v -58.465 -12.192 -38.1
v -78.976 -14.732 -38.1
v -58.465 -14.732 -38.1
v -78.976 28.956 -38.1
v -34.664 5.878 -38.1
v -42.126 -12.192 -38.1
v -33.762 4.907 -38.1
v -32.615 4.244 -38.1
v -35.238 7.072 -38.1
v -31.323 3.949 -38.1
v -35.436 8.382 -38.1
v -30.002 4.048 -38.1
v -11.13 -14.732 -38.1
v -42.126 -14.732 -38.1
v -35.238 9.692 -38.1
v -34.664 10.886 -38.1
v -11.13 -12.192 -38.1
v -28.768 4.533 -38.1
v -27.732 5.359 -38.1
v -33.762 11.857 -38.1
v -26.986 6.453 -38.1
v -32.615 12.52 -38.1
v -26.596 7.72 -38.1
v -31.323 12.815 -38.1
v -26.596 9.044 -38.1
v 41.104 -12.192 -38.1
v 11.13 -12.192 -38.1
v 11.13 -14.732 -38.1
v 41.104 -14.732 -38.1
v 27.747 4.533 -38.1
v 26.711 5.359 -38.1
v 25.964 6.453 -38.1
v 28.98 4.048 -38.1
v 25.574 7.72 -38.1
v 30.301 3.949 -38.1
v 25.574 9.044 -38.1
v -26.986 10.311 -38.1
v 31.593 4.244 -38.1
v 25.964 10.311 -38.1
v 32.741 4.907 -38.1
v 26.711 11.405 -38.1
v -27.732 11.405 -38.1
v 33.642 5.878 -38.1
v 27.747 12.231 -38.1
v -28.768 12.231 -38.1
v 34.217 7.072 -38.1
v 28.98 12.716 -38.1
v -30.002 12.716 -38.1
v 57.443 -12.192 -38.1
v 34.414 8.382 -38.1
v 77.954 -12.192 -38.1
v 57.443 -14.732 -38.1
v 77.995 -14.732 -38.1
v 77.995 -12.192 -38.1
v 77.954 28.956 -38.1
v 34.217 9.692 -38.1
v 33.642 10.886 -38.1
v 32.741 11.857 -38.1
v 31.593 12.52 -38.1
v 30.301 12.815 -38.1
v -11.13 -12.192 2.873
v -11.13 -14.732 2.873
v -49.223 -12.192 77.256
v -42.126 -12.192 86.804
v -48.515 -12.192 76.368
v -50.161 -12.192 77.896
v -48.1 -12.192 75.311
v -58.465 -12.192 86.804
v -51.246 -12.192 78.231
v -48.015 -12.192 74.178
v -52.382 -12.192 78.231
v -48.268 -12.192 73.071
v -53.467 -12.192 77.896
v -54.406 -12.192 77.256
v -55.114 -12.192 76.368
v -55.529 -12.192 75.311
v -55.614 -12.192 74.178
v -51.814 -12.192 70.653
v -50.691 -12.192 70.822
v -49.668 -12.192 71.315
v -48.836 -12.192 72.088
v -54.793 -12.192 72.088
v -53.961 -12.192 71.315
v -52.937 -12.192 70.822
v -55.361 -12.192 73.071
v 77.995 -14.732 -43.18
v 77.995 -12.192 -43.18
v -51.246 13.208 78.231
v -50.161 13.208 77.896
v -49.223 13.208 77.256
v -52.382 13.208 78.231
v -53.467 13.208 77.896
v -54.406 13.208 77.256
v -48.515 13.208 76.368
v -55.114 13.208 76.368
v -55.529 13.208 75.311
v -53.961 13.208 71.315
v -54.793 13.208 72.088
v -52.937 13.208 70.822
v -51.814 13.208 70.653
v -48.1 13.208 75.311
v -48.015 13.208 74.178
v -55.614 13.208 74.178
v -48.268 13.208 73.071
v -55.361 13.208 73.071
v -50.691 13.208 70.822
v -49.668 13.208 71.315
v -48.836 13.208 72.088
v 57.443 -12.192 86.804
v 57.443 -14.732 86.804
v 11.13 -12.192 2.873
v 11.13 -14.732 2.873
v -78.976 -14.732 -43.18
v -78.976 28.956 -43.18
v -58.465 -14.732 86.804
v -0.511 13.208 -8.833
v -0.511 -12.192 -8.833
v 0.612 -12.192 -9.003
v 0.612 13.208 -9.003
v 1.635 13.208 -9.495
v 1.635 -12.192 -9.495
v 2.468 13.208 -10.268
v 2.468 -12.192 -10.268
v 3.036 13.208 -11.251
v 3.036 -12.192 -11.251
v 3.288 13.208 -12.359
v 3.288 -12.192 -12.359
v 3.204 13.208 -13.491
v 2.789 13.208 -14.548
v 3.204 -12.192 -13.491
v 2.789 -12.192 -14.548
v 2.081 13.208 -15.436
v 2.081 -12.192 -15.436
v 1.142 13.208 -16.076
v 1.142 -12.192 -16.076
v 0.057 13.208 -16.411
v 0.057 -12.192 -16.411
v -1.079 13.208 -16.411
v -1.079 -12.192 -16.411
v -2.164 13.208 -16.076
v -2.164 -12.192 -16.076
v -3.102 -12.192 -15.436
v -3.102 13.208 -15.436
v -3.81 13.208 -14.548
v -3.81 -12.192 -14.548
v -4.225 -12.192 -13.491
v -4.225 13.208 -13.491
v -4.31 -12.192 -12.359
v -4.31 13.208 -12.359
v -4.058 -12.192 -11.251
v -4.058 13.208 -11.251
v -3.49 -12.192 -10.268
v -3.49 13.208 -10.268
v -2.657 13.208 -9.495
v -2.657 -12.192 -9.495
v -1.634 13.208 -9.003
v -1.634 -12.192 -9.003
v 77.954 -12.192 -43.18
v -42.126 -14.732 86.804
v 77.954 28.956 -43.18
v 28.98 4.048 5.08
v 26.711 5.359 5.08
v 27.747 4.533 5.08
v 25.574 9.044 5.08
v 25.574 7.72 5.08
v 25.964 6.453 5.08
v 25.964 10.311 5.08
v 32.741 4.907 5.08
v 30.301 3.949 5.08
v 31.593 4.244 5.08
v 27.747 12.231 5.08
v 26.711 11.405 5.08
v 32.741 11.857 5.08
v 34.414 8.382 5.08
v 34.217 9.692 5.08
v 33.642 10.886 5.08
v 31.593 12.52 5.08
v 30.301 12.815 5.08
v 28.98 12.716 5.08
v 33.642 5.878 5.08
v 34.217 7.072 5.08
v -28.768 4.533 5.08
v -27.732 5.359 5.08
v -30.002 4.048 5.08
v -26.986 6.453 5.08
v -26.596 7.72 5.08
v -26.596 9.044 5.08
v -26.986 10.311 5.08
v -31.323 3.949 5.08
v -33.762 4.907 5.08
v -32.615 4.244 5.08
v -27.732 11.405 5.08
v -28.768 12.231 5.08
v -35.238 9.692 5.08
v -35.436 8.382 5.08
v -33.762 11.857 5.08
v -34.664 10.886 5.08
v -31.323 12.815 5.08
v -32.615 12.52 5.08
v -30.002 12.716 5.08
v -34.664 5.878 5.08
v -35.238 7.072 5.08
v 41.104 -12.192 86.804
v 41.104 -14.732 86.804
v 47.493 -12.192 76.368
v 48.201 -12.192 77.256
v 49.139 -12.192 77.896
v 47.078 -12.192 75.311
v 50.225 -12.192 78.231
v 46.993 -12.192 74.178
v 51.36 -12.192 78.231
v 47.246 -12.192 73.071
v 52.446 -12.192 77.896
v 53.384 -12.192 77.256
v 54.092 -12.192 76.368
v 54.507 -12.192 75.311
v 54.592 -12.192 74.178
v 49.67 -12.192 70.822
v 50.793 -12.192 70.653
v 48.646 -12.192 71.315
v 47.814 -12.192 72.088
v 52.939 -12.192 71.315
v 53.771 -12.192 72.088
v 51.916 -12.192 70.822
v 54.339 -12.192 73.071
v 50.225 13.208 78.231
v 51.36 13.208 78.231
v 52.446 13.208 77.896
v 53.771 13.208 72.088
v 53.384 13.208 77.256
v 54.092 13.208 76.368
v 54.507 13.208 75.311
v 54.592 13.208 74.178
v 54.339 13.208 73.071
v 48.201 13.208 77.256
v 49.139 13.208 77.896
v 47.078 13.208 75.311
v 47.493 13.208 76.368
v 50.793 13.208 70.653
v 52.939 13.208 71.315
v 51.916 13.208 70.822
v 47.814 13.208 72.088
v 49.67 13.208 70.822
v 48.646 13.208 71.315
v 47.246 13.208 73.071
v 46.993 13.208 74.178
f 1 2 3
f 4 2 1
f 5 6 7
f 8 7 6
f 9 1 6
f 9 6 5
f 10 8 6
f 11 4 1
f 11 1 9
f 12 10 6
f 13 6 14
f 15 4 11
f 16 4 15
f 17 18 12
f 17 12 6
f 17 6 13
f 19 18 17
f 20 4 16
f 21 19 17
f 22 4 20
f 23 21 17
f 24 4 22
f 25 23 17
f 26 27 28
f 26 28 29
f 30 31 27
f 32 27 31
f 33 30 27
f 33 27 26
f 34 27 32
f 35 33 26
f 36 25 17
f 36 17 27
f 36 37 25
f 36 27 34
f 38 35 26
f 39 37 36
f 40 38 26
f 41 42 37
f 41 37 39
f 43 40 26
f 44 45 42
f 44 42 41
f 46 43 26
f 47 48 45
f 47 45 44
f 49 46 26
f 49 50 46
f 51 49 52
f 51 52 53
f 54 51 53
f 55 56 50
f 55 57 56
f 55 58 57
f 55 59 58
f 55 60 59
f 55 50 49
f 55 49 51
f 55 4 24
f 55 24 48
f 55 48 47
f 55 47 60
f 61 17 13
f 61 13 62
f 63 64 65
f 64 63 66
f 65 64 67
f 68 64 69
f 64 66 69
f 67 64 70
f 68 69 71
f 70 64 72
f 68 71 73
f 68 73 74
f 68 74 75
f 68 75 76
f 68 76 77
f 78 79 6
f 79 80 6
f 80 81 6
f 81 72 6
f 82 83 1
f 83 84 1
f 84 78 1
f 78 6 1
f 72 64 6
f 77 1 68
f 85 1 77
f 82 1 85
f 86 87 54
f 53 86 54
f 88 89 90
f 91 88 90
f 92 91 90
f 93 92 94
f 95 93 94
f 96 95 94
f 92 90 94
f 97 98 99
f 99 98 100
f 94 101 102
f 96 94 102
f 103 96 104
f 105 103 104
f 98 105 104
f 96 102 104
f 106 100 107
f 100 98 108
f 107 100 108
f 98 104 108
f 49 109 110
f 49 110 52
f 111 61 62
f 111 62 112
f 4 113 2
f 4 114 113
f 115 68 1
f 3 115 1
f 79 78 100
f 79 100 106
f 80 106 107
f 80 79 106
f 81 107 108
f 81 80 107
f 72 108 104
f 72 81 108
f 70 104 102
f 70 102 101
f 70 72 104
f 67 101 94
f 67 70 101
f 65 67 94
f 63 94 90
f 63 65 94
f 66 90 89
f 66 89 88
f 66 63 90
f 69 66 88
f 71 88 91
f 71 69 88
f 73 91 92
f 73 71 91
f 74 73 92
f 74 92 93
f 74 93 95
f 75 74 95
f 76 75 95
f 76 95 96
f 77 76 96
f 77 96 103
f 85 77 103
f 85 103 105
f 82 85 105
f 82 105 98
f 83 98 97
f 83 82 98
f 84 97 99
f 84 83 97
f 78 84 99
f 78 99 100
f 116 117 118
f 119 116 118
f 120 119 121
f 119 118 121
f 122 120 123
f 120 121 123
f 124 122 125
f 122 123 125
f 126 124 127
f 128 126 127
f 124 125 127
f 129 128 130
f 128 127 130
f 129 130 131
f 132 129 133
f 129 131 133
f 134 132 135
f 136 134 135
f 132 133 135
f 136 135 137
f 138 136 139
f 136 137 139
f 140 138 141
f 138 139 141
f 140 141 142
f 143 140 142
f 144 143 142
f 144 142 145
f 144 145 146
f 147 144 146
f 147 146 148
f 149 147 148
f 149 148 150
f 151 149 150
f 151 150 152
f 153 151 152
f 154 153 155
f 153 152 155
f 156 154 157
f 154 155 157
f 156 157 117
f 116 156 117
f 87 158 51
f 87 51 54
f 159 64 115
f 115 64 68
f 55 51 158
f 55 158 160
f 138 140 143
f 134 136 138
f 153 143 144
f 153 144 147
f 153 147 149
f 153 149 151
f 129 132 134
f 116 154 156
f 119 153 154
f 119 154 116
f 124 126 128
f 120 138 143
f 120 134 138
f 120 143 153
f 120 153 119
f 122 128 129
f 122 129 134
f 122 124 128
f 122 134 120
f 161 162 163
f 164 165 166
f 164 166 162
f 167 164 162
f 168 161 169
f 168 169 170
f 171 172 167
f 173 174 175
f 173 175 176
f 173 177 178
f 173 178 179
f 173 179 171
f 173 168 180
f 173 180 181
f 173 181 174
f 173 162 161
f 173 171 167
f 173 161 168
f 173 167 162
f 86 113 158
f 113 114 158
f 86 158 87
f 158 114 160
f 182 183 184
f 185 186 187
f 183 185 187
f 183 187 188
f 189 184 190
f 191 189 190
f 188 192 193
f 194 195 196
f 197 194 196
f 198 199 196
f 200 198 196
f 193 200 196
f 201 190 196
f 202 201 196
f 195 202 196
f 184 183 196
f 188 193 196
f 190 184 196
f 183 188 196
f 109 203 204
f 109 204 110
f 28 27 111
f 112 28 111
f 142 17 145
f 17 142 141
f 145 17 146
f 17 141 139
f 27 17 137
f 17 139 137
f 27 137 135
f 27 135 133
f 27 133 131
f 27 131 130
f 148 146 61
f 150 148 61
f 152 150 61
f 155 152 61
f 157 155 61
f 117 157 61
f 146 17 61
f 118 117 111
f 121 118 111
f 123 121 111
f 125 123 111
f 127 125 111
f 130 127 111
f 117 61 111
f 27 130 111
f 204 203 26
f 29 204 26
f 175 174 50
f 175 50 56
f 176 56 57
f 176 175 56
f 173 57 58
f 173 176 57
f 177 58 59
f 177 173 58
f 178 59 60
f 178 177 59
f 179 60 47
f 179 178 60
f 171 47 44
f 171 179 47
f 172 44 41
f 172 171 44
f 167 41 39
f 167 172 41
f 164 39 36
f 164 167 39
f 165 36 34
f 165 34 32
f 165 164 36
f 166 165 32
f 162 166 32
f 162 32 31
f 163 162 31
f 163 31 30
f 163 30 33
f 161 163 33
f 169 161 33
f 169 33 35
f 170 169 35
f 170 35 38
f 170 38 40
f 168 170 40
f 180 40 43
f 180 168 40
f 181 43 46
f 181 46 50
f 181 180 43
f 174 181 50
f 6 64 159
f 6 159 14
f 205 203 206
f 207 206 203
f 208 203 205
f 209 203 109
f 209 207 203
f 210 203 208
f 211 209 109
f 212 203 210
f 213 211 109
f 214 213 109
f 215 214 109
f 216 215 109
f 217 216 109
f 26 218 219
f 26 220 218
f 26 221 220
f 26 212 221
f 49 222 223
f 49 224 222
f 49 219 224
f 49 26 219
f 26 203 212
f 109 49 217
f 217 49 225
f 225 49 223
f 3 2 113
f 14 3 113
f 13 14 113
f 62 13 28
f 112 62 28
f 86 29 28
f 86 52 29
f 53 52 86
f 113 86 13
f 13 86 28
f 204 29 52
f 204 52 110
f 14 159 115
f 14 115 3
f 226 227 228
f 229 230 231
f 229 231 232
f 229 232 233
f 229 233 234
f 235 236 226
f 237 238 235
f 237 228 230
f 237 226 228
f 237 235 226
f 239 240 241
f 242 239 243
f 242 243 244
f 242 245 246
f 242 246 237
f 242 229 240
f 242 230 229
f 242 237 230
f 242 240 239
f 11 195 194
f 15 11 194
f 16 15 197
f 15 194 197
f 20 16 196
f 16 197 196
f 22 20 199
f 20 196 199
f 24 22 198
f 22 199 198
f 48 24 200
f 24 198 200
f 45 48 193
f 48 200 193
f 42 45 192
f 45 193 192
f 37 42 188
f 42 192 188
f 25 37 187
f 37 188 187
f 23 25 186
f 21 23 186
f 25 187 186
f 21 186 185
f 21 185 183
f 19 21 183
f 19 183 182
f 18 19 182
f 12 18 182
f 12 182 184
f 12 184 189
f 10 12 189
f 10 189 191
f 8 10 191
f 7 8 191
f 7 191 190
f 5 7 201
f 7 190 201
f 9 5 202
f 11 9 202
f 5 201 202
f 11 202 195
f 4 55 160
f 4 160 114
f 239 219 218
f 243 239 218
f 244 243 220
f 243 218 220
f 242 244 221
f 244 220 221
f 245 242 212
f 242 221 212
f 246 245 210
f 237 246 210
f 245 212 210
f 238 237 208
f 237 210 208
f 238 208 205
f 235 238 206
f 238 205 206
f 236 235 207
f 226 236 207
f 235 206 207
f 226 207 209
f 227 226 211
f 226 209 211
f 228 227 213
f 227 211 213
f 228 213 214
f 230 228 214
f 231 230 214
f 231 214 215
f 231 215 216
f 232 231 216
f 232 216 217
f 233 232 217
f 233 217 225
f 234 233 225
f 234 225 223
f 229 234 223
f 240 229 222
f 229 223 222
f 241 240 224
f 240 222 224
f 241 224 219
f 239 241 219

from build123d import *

# Parameters (mm, degrees)
BOSS_EXTRUDE1_START = 5.08
SKETCH1_R           = 4.445
BOSS_EXTRUDE1_DEPTH = 43.18
SKETCH2_W           = 156.929873994
SKETCH2_H           = 41.148
BOSS_EXTRUDE2_DEPTH = 5.08
SKETCH3_W           = 22.259444318
SKETCH3_H           = 46.05258329
BOSS_EXTRUDE3_DEPTH = 2.54
SKETCH4_W           = 16.338838854
SKETCH4_H           = 129.983858652
BOSS_EXTRUDE4_DEPTH = 2.54
SKETCH5_W           = 156.97130624
SKETCH5_H           = 5.08
BOSS_EXTRUDE5_DEPTH = 2.54
SKETCH6_R           = 3.81
BOSS_EXTRUDE6_DEPTH = 25.4
SKETCH8_R           = 3.81
BOSS_EXTRUDE7_DEPTH = 25.4


with BuildPart() as part:
    # Sketch1 → Boss-Extrude1 (new body)
    with BuildSketch(Plane.XY.offset(BOSS_EXTRUDE1_START)):
        with Locations((29.969120003, 8.382)):
            Circle(SKETCH1_R)
    extrude(amount=-BOSS_EXTRUDE1_DEPTH)


with BuildPart() as body_2:
    # Mirror2: mirrored copy
    add(part.part.mirror(Plane(origin=(-0.510879997, 0, 0), x_dir=(0, 0, 1), z_dir=(1, 0, 0))))


with BuildPart() as part_1:
    add(part.part)

    add(body_2.part)  # Boss-Extrude2 merges body 2
    # Sketch2 → Boss-Extrude2 (add)
    with BuildSketch(Plane(origin=(0, 0, -38.1), x_dir=(-1, 0, 0), z_dir=(0, 0, -1))):
        with Locations((0.510879997, 8.382)):
            Rectangle(SKETCH2_W, SKETCH2_H)
    extrude(amount=BOSS_EXTRUDE2_DEPTH)

    # Sketch3 → Boss-Extrude3 (add)
    with BuildSketch(Plane.XZ.offset(12.192)):
        with Locations((0, -20.153708355)):
            Rectangle(SKETCH3_W, SKETCH3_H)
    extrude(amount=BOSS_EXTRUDE3_DEPTH)

    # Sketch4 → Boss-Extrude4 (add)
    with BuildSketch(Plane(origin=(0, -12.192, 0), x_dir=(-1, 0, 0), z_dir=(0, -1, 0))):
        with Locations((50.295624604, -21.811929326)):
            Rectangle(SKETCH4_W, SKETCH4_H)
    boss_extrude4 = extrude(amount=BOSS_EXTRUDE4_DEPTH)

    # Mirror3: Boss-Extrude4 across plane
    add(boss_extrude4.mirror(Plane(origin=(-0.510879997, 0, 0), x_dir=(0, 0, 1), z_dir=(1, 0, 0))))

    # Sketch5 → Boss-Extrude5 (add)
    with BuildSketch(Plane.XZ.offset(12.192)):
        with Locations((-0.490163874, -40.64)):
            Rectangle(SKETCH5_W, SKETCH5_H)
    extrude(amount=BOSS_EXTRUDE5_DEPTH)

    # Sketch6 → Boss-Extrude6 (add)
    with BuildSketch(Plane(origin=(0, -12.192, 0), x_dir=(1, 0, 0), z_dir=(0, 1, 0))):
        with Locations(Location((-0.510879997, 12.643336172, 0), (0, 0, 270))):
            Circle(SKETCH6_R)
    extrude(amount=BOSS_EXTRUDE6_DEPTH)

    # Sketch8 → Boss-Extrude7 (add)
    with BuildSketch(Plane(origin=(0, -12.192, 0), x_dir=(1, 0, 0), z_dir=(0, 1, 0))):
        with Locations(Location((50.792572725, -74.463197468, 0), (0, 0, 90))):
            Circle(SKETCH8_R)
    boss_extrude7 = extrude(amount=BOSS_EXTRUDE7_DEPTH)

    # Mirror4: Boss-Extrude7 across plane
    add(boss_extrude7.mirror(Plane(origin=(-0.510879997, 0, 0), x_dir=(0, 0, 1), z_dir=(1, 0, 0))))


solid = part_1.part
